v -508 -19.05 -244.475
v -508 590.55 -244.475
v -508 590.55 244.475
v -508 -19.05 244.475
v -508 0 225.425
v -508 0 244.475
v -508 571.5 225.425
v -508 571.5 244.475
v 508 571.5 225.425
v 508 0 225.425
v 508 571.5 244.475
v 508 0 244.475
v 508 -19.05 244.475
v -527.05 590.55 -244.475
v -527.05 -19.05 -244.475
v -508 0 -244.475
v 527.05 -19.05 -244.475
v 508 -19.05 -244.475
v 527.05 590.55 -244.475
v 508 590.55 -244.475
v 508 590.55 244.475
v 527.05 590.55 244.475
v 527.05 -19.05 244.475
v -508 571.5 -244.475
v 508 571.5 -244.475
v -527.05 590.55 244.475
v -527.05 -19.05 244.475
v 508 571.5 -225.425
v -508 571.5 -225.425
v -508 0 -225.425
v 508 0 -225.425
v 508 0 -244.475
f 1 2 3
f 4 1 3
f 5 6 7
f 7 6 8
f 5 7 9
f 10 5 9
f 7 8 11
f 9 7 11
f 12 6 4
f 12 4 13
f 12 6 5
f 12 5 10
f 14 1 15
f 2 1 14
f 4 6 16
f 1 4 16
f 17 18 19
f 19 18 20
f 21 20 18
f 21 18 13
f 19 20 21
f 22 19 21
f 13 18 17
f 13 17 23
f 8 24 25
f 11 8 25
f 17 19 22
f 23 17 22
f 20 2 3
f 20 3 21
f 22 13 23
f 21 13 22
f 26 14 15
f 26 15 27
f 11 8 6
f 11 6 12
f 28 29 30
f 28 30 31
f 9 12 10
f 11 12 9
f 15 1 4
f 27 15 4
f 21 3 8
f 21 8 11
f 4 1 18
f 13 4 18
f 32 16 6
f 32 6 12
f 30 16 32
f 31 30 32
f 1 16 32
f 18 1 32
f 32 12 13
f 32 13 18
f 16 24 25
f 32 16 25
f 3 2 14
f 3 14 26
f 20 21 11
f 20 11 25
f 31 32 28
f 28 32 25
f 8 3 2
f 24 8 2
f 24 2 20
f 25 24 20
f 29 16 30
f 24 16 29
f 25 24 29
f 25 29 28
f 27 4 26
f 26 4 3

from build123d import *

# Parameters (mm, degrees)
SKETCH1_W    = 1016
SKETCH1_H    = 488.95
BOTTOM_DEPTH = 19.05
SKETCH2_W    = 488.95
SKETCH2_H    = 609.6
SIDE_DEPTH   = 19.05
SKETCH3_W    = 1016
SKETCH3_H    = 488.95
TOP_DEPTH    = 19.05
SKETCH6_W    = 1016
SKETCH6_H    = 571.5
FRONT_DEPTH  = 19.05


with BuildPart() as part:
    # Sketch1 → bottom (new body)
    with BuildSketch(Plane(origin=(0, 0, 0), x_dir=(1, 0, 0), z_dir=(0, 1, 0))):
        Rectangle(SKETCH1_W, SKETCH1_H)
    extrude(amount=-BOTTOM_DEPTH)


with BuildPart() as body_2:
    # Sketch2 → side (new body)
    with BuildSketch(Plane.ZY.offset(508)):
        with Locations((0, 285.75)):
            Rectangle(SKETCH2_W, SKETCH2_H)
    extrude(amount=SIDE_DEPTH)


with BuildPart() as body_3:
    # Mirror1: mirrored copy
    add(body_2.part.mirror(Plane(origin=(0, 0, 0), x_dir=(0, 0, 1), z_dir=(1, 0, 0))))


with BuildPart() as body_4:
    # Sketch3 → top (new body)
    with BuildSketch(Plane(origin=(0, 590.55, 0), x_dir=(1, 0, 0), z_dir=(0, 1, 0))):
        Rectangle(SKETCH3_W, SKETCH3_H)
    extrude(amount=-TOP_DEPTH)


with BuildPart() as body_5:
    # Sketch6 → front (new body)
    with BuildSketch(Plane.XY.offset(244.475)):
        with Locations((0, 285.75)):
            Rectangle(SKETCH6_W, SKETCH6_H)
    extrude(amount=-FRONT_DEPTH)


with BuildPart() as body_6:
    # Mirror2: mirrored copy
    add(body_5.part.mirror(Plane.XY))


solid = Compound([part.part, body_2.part, body_3.part, body_4.part, body_5.part, body_6.part])
